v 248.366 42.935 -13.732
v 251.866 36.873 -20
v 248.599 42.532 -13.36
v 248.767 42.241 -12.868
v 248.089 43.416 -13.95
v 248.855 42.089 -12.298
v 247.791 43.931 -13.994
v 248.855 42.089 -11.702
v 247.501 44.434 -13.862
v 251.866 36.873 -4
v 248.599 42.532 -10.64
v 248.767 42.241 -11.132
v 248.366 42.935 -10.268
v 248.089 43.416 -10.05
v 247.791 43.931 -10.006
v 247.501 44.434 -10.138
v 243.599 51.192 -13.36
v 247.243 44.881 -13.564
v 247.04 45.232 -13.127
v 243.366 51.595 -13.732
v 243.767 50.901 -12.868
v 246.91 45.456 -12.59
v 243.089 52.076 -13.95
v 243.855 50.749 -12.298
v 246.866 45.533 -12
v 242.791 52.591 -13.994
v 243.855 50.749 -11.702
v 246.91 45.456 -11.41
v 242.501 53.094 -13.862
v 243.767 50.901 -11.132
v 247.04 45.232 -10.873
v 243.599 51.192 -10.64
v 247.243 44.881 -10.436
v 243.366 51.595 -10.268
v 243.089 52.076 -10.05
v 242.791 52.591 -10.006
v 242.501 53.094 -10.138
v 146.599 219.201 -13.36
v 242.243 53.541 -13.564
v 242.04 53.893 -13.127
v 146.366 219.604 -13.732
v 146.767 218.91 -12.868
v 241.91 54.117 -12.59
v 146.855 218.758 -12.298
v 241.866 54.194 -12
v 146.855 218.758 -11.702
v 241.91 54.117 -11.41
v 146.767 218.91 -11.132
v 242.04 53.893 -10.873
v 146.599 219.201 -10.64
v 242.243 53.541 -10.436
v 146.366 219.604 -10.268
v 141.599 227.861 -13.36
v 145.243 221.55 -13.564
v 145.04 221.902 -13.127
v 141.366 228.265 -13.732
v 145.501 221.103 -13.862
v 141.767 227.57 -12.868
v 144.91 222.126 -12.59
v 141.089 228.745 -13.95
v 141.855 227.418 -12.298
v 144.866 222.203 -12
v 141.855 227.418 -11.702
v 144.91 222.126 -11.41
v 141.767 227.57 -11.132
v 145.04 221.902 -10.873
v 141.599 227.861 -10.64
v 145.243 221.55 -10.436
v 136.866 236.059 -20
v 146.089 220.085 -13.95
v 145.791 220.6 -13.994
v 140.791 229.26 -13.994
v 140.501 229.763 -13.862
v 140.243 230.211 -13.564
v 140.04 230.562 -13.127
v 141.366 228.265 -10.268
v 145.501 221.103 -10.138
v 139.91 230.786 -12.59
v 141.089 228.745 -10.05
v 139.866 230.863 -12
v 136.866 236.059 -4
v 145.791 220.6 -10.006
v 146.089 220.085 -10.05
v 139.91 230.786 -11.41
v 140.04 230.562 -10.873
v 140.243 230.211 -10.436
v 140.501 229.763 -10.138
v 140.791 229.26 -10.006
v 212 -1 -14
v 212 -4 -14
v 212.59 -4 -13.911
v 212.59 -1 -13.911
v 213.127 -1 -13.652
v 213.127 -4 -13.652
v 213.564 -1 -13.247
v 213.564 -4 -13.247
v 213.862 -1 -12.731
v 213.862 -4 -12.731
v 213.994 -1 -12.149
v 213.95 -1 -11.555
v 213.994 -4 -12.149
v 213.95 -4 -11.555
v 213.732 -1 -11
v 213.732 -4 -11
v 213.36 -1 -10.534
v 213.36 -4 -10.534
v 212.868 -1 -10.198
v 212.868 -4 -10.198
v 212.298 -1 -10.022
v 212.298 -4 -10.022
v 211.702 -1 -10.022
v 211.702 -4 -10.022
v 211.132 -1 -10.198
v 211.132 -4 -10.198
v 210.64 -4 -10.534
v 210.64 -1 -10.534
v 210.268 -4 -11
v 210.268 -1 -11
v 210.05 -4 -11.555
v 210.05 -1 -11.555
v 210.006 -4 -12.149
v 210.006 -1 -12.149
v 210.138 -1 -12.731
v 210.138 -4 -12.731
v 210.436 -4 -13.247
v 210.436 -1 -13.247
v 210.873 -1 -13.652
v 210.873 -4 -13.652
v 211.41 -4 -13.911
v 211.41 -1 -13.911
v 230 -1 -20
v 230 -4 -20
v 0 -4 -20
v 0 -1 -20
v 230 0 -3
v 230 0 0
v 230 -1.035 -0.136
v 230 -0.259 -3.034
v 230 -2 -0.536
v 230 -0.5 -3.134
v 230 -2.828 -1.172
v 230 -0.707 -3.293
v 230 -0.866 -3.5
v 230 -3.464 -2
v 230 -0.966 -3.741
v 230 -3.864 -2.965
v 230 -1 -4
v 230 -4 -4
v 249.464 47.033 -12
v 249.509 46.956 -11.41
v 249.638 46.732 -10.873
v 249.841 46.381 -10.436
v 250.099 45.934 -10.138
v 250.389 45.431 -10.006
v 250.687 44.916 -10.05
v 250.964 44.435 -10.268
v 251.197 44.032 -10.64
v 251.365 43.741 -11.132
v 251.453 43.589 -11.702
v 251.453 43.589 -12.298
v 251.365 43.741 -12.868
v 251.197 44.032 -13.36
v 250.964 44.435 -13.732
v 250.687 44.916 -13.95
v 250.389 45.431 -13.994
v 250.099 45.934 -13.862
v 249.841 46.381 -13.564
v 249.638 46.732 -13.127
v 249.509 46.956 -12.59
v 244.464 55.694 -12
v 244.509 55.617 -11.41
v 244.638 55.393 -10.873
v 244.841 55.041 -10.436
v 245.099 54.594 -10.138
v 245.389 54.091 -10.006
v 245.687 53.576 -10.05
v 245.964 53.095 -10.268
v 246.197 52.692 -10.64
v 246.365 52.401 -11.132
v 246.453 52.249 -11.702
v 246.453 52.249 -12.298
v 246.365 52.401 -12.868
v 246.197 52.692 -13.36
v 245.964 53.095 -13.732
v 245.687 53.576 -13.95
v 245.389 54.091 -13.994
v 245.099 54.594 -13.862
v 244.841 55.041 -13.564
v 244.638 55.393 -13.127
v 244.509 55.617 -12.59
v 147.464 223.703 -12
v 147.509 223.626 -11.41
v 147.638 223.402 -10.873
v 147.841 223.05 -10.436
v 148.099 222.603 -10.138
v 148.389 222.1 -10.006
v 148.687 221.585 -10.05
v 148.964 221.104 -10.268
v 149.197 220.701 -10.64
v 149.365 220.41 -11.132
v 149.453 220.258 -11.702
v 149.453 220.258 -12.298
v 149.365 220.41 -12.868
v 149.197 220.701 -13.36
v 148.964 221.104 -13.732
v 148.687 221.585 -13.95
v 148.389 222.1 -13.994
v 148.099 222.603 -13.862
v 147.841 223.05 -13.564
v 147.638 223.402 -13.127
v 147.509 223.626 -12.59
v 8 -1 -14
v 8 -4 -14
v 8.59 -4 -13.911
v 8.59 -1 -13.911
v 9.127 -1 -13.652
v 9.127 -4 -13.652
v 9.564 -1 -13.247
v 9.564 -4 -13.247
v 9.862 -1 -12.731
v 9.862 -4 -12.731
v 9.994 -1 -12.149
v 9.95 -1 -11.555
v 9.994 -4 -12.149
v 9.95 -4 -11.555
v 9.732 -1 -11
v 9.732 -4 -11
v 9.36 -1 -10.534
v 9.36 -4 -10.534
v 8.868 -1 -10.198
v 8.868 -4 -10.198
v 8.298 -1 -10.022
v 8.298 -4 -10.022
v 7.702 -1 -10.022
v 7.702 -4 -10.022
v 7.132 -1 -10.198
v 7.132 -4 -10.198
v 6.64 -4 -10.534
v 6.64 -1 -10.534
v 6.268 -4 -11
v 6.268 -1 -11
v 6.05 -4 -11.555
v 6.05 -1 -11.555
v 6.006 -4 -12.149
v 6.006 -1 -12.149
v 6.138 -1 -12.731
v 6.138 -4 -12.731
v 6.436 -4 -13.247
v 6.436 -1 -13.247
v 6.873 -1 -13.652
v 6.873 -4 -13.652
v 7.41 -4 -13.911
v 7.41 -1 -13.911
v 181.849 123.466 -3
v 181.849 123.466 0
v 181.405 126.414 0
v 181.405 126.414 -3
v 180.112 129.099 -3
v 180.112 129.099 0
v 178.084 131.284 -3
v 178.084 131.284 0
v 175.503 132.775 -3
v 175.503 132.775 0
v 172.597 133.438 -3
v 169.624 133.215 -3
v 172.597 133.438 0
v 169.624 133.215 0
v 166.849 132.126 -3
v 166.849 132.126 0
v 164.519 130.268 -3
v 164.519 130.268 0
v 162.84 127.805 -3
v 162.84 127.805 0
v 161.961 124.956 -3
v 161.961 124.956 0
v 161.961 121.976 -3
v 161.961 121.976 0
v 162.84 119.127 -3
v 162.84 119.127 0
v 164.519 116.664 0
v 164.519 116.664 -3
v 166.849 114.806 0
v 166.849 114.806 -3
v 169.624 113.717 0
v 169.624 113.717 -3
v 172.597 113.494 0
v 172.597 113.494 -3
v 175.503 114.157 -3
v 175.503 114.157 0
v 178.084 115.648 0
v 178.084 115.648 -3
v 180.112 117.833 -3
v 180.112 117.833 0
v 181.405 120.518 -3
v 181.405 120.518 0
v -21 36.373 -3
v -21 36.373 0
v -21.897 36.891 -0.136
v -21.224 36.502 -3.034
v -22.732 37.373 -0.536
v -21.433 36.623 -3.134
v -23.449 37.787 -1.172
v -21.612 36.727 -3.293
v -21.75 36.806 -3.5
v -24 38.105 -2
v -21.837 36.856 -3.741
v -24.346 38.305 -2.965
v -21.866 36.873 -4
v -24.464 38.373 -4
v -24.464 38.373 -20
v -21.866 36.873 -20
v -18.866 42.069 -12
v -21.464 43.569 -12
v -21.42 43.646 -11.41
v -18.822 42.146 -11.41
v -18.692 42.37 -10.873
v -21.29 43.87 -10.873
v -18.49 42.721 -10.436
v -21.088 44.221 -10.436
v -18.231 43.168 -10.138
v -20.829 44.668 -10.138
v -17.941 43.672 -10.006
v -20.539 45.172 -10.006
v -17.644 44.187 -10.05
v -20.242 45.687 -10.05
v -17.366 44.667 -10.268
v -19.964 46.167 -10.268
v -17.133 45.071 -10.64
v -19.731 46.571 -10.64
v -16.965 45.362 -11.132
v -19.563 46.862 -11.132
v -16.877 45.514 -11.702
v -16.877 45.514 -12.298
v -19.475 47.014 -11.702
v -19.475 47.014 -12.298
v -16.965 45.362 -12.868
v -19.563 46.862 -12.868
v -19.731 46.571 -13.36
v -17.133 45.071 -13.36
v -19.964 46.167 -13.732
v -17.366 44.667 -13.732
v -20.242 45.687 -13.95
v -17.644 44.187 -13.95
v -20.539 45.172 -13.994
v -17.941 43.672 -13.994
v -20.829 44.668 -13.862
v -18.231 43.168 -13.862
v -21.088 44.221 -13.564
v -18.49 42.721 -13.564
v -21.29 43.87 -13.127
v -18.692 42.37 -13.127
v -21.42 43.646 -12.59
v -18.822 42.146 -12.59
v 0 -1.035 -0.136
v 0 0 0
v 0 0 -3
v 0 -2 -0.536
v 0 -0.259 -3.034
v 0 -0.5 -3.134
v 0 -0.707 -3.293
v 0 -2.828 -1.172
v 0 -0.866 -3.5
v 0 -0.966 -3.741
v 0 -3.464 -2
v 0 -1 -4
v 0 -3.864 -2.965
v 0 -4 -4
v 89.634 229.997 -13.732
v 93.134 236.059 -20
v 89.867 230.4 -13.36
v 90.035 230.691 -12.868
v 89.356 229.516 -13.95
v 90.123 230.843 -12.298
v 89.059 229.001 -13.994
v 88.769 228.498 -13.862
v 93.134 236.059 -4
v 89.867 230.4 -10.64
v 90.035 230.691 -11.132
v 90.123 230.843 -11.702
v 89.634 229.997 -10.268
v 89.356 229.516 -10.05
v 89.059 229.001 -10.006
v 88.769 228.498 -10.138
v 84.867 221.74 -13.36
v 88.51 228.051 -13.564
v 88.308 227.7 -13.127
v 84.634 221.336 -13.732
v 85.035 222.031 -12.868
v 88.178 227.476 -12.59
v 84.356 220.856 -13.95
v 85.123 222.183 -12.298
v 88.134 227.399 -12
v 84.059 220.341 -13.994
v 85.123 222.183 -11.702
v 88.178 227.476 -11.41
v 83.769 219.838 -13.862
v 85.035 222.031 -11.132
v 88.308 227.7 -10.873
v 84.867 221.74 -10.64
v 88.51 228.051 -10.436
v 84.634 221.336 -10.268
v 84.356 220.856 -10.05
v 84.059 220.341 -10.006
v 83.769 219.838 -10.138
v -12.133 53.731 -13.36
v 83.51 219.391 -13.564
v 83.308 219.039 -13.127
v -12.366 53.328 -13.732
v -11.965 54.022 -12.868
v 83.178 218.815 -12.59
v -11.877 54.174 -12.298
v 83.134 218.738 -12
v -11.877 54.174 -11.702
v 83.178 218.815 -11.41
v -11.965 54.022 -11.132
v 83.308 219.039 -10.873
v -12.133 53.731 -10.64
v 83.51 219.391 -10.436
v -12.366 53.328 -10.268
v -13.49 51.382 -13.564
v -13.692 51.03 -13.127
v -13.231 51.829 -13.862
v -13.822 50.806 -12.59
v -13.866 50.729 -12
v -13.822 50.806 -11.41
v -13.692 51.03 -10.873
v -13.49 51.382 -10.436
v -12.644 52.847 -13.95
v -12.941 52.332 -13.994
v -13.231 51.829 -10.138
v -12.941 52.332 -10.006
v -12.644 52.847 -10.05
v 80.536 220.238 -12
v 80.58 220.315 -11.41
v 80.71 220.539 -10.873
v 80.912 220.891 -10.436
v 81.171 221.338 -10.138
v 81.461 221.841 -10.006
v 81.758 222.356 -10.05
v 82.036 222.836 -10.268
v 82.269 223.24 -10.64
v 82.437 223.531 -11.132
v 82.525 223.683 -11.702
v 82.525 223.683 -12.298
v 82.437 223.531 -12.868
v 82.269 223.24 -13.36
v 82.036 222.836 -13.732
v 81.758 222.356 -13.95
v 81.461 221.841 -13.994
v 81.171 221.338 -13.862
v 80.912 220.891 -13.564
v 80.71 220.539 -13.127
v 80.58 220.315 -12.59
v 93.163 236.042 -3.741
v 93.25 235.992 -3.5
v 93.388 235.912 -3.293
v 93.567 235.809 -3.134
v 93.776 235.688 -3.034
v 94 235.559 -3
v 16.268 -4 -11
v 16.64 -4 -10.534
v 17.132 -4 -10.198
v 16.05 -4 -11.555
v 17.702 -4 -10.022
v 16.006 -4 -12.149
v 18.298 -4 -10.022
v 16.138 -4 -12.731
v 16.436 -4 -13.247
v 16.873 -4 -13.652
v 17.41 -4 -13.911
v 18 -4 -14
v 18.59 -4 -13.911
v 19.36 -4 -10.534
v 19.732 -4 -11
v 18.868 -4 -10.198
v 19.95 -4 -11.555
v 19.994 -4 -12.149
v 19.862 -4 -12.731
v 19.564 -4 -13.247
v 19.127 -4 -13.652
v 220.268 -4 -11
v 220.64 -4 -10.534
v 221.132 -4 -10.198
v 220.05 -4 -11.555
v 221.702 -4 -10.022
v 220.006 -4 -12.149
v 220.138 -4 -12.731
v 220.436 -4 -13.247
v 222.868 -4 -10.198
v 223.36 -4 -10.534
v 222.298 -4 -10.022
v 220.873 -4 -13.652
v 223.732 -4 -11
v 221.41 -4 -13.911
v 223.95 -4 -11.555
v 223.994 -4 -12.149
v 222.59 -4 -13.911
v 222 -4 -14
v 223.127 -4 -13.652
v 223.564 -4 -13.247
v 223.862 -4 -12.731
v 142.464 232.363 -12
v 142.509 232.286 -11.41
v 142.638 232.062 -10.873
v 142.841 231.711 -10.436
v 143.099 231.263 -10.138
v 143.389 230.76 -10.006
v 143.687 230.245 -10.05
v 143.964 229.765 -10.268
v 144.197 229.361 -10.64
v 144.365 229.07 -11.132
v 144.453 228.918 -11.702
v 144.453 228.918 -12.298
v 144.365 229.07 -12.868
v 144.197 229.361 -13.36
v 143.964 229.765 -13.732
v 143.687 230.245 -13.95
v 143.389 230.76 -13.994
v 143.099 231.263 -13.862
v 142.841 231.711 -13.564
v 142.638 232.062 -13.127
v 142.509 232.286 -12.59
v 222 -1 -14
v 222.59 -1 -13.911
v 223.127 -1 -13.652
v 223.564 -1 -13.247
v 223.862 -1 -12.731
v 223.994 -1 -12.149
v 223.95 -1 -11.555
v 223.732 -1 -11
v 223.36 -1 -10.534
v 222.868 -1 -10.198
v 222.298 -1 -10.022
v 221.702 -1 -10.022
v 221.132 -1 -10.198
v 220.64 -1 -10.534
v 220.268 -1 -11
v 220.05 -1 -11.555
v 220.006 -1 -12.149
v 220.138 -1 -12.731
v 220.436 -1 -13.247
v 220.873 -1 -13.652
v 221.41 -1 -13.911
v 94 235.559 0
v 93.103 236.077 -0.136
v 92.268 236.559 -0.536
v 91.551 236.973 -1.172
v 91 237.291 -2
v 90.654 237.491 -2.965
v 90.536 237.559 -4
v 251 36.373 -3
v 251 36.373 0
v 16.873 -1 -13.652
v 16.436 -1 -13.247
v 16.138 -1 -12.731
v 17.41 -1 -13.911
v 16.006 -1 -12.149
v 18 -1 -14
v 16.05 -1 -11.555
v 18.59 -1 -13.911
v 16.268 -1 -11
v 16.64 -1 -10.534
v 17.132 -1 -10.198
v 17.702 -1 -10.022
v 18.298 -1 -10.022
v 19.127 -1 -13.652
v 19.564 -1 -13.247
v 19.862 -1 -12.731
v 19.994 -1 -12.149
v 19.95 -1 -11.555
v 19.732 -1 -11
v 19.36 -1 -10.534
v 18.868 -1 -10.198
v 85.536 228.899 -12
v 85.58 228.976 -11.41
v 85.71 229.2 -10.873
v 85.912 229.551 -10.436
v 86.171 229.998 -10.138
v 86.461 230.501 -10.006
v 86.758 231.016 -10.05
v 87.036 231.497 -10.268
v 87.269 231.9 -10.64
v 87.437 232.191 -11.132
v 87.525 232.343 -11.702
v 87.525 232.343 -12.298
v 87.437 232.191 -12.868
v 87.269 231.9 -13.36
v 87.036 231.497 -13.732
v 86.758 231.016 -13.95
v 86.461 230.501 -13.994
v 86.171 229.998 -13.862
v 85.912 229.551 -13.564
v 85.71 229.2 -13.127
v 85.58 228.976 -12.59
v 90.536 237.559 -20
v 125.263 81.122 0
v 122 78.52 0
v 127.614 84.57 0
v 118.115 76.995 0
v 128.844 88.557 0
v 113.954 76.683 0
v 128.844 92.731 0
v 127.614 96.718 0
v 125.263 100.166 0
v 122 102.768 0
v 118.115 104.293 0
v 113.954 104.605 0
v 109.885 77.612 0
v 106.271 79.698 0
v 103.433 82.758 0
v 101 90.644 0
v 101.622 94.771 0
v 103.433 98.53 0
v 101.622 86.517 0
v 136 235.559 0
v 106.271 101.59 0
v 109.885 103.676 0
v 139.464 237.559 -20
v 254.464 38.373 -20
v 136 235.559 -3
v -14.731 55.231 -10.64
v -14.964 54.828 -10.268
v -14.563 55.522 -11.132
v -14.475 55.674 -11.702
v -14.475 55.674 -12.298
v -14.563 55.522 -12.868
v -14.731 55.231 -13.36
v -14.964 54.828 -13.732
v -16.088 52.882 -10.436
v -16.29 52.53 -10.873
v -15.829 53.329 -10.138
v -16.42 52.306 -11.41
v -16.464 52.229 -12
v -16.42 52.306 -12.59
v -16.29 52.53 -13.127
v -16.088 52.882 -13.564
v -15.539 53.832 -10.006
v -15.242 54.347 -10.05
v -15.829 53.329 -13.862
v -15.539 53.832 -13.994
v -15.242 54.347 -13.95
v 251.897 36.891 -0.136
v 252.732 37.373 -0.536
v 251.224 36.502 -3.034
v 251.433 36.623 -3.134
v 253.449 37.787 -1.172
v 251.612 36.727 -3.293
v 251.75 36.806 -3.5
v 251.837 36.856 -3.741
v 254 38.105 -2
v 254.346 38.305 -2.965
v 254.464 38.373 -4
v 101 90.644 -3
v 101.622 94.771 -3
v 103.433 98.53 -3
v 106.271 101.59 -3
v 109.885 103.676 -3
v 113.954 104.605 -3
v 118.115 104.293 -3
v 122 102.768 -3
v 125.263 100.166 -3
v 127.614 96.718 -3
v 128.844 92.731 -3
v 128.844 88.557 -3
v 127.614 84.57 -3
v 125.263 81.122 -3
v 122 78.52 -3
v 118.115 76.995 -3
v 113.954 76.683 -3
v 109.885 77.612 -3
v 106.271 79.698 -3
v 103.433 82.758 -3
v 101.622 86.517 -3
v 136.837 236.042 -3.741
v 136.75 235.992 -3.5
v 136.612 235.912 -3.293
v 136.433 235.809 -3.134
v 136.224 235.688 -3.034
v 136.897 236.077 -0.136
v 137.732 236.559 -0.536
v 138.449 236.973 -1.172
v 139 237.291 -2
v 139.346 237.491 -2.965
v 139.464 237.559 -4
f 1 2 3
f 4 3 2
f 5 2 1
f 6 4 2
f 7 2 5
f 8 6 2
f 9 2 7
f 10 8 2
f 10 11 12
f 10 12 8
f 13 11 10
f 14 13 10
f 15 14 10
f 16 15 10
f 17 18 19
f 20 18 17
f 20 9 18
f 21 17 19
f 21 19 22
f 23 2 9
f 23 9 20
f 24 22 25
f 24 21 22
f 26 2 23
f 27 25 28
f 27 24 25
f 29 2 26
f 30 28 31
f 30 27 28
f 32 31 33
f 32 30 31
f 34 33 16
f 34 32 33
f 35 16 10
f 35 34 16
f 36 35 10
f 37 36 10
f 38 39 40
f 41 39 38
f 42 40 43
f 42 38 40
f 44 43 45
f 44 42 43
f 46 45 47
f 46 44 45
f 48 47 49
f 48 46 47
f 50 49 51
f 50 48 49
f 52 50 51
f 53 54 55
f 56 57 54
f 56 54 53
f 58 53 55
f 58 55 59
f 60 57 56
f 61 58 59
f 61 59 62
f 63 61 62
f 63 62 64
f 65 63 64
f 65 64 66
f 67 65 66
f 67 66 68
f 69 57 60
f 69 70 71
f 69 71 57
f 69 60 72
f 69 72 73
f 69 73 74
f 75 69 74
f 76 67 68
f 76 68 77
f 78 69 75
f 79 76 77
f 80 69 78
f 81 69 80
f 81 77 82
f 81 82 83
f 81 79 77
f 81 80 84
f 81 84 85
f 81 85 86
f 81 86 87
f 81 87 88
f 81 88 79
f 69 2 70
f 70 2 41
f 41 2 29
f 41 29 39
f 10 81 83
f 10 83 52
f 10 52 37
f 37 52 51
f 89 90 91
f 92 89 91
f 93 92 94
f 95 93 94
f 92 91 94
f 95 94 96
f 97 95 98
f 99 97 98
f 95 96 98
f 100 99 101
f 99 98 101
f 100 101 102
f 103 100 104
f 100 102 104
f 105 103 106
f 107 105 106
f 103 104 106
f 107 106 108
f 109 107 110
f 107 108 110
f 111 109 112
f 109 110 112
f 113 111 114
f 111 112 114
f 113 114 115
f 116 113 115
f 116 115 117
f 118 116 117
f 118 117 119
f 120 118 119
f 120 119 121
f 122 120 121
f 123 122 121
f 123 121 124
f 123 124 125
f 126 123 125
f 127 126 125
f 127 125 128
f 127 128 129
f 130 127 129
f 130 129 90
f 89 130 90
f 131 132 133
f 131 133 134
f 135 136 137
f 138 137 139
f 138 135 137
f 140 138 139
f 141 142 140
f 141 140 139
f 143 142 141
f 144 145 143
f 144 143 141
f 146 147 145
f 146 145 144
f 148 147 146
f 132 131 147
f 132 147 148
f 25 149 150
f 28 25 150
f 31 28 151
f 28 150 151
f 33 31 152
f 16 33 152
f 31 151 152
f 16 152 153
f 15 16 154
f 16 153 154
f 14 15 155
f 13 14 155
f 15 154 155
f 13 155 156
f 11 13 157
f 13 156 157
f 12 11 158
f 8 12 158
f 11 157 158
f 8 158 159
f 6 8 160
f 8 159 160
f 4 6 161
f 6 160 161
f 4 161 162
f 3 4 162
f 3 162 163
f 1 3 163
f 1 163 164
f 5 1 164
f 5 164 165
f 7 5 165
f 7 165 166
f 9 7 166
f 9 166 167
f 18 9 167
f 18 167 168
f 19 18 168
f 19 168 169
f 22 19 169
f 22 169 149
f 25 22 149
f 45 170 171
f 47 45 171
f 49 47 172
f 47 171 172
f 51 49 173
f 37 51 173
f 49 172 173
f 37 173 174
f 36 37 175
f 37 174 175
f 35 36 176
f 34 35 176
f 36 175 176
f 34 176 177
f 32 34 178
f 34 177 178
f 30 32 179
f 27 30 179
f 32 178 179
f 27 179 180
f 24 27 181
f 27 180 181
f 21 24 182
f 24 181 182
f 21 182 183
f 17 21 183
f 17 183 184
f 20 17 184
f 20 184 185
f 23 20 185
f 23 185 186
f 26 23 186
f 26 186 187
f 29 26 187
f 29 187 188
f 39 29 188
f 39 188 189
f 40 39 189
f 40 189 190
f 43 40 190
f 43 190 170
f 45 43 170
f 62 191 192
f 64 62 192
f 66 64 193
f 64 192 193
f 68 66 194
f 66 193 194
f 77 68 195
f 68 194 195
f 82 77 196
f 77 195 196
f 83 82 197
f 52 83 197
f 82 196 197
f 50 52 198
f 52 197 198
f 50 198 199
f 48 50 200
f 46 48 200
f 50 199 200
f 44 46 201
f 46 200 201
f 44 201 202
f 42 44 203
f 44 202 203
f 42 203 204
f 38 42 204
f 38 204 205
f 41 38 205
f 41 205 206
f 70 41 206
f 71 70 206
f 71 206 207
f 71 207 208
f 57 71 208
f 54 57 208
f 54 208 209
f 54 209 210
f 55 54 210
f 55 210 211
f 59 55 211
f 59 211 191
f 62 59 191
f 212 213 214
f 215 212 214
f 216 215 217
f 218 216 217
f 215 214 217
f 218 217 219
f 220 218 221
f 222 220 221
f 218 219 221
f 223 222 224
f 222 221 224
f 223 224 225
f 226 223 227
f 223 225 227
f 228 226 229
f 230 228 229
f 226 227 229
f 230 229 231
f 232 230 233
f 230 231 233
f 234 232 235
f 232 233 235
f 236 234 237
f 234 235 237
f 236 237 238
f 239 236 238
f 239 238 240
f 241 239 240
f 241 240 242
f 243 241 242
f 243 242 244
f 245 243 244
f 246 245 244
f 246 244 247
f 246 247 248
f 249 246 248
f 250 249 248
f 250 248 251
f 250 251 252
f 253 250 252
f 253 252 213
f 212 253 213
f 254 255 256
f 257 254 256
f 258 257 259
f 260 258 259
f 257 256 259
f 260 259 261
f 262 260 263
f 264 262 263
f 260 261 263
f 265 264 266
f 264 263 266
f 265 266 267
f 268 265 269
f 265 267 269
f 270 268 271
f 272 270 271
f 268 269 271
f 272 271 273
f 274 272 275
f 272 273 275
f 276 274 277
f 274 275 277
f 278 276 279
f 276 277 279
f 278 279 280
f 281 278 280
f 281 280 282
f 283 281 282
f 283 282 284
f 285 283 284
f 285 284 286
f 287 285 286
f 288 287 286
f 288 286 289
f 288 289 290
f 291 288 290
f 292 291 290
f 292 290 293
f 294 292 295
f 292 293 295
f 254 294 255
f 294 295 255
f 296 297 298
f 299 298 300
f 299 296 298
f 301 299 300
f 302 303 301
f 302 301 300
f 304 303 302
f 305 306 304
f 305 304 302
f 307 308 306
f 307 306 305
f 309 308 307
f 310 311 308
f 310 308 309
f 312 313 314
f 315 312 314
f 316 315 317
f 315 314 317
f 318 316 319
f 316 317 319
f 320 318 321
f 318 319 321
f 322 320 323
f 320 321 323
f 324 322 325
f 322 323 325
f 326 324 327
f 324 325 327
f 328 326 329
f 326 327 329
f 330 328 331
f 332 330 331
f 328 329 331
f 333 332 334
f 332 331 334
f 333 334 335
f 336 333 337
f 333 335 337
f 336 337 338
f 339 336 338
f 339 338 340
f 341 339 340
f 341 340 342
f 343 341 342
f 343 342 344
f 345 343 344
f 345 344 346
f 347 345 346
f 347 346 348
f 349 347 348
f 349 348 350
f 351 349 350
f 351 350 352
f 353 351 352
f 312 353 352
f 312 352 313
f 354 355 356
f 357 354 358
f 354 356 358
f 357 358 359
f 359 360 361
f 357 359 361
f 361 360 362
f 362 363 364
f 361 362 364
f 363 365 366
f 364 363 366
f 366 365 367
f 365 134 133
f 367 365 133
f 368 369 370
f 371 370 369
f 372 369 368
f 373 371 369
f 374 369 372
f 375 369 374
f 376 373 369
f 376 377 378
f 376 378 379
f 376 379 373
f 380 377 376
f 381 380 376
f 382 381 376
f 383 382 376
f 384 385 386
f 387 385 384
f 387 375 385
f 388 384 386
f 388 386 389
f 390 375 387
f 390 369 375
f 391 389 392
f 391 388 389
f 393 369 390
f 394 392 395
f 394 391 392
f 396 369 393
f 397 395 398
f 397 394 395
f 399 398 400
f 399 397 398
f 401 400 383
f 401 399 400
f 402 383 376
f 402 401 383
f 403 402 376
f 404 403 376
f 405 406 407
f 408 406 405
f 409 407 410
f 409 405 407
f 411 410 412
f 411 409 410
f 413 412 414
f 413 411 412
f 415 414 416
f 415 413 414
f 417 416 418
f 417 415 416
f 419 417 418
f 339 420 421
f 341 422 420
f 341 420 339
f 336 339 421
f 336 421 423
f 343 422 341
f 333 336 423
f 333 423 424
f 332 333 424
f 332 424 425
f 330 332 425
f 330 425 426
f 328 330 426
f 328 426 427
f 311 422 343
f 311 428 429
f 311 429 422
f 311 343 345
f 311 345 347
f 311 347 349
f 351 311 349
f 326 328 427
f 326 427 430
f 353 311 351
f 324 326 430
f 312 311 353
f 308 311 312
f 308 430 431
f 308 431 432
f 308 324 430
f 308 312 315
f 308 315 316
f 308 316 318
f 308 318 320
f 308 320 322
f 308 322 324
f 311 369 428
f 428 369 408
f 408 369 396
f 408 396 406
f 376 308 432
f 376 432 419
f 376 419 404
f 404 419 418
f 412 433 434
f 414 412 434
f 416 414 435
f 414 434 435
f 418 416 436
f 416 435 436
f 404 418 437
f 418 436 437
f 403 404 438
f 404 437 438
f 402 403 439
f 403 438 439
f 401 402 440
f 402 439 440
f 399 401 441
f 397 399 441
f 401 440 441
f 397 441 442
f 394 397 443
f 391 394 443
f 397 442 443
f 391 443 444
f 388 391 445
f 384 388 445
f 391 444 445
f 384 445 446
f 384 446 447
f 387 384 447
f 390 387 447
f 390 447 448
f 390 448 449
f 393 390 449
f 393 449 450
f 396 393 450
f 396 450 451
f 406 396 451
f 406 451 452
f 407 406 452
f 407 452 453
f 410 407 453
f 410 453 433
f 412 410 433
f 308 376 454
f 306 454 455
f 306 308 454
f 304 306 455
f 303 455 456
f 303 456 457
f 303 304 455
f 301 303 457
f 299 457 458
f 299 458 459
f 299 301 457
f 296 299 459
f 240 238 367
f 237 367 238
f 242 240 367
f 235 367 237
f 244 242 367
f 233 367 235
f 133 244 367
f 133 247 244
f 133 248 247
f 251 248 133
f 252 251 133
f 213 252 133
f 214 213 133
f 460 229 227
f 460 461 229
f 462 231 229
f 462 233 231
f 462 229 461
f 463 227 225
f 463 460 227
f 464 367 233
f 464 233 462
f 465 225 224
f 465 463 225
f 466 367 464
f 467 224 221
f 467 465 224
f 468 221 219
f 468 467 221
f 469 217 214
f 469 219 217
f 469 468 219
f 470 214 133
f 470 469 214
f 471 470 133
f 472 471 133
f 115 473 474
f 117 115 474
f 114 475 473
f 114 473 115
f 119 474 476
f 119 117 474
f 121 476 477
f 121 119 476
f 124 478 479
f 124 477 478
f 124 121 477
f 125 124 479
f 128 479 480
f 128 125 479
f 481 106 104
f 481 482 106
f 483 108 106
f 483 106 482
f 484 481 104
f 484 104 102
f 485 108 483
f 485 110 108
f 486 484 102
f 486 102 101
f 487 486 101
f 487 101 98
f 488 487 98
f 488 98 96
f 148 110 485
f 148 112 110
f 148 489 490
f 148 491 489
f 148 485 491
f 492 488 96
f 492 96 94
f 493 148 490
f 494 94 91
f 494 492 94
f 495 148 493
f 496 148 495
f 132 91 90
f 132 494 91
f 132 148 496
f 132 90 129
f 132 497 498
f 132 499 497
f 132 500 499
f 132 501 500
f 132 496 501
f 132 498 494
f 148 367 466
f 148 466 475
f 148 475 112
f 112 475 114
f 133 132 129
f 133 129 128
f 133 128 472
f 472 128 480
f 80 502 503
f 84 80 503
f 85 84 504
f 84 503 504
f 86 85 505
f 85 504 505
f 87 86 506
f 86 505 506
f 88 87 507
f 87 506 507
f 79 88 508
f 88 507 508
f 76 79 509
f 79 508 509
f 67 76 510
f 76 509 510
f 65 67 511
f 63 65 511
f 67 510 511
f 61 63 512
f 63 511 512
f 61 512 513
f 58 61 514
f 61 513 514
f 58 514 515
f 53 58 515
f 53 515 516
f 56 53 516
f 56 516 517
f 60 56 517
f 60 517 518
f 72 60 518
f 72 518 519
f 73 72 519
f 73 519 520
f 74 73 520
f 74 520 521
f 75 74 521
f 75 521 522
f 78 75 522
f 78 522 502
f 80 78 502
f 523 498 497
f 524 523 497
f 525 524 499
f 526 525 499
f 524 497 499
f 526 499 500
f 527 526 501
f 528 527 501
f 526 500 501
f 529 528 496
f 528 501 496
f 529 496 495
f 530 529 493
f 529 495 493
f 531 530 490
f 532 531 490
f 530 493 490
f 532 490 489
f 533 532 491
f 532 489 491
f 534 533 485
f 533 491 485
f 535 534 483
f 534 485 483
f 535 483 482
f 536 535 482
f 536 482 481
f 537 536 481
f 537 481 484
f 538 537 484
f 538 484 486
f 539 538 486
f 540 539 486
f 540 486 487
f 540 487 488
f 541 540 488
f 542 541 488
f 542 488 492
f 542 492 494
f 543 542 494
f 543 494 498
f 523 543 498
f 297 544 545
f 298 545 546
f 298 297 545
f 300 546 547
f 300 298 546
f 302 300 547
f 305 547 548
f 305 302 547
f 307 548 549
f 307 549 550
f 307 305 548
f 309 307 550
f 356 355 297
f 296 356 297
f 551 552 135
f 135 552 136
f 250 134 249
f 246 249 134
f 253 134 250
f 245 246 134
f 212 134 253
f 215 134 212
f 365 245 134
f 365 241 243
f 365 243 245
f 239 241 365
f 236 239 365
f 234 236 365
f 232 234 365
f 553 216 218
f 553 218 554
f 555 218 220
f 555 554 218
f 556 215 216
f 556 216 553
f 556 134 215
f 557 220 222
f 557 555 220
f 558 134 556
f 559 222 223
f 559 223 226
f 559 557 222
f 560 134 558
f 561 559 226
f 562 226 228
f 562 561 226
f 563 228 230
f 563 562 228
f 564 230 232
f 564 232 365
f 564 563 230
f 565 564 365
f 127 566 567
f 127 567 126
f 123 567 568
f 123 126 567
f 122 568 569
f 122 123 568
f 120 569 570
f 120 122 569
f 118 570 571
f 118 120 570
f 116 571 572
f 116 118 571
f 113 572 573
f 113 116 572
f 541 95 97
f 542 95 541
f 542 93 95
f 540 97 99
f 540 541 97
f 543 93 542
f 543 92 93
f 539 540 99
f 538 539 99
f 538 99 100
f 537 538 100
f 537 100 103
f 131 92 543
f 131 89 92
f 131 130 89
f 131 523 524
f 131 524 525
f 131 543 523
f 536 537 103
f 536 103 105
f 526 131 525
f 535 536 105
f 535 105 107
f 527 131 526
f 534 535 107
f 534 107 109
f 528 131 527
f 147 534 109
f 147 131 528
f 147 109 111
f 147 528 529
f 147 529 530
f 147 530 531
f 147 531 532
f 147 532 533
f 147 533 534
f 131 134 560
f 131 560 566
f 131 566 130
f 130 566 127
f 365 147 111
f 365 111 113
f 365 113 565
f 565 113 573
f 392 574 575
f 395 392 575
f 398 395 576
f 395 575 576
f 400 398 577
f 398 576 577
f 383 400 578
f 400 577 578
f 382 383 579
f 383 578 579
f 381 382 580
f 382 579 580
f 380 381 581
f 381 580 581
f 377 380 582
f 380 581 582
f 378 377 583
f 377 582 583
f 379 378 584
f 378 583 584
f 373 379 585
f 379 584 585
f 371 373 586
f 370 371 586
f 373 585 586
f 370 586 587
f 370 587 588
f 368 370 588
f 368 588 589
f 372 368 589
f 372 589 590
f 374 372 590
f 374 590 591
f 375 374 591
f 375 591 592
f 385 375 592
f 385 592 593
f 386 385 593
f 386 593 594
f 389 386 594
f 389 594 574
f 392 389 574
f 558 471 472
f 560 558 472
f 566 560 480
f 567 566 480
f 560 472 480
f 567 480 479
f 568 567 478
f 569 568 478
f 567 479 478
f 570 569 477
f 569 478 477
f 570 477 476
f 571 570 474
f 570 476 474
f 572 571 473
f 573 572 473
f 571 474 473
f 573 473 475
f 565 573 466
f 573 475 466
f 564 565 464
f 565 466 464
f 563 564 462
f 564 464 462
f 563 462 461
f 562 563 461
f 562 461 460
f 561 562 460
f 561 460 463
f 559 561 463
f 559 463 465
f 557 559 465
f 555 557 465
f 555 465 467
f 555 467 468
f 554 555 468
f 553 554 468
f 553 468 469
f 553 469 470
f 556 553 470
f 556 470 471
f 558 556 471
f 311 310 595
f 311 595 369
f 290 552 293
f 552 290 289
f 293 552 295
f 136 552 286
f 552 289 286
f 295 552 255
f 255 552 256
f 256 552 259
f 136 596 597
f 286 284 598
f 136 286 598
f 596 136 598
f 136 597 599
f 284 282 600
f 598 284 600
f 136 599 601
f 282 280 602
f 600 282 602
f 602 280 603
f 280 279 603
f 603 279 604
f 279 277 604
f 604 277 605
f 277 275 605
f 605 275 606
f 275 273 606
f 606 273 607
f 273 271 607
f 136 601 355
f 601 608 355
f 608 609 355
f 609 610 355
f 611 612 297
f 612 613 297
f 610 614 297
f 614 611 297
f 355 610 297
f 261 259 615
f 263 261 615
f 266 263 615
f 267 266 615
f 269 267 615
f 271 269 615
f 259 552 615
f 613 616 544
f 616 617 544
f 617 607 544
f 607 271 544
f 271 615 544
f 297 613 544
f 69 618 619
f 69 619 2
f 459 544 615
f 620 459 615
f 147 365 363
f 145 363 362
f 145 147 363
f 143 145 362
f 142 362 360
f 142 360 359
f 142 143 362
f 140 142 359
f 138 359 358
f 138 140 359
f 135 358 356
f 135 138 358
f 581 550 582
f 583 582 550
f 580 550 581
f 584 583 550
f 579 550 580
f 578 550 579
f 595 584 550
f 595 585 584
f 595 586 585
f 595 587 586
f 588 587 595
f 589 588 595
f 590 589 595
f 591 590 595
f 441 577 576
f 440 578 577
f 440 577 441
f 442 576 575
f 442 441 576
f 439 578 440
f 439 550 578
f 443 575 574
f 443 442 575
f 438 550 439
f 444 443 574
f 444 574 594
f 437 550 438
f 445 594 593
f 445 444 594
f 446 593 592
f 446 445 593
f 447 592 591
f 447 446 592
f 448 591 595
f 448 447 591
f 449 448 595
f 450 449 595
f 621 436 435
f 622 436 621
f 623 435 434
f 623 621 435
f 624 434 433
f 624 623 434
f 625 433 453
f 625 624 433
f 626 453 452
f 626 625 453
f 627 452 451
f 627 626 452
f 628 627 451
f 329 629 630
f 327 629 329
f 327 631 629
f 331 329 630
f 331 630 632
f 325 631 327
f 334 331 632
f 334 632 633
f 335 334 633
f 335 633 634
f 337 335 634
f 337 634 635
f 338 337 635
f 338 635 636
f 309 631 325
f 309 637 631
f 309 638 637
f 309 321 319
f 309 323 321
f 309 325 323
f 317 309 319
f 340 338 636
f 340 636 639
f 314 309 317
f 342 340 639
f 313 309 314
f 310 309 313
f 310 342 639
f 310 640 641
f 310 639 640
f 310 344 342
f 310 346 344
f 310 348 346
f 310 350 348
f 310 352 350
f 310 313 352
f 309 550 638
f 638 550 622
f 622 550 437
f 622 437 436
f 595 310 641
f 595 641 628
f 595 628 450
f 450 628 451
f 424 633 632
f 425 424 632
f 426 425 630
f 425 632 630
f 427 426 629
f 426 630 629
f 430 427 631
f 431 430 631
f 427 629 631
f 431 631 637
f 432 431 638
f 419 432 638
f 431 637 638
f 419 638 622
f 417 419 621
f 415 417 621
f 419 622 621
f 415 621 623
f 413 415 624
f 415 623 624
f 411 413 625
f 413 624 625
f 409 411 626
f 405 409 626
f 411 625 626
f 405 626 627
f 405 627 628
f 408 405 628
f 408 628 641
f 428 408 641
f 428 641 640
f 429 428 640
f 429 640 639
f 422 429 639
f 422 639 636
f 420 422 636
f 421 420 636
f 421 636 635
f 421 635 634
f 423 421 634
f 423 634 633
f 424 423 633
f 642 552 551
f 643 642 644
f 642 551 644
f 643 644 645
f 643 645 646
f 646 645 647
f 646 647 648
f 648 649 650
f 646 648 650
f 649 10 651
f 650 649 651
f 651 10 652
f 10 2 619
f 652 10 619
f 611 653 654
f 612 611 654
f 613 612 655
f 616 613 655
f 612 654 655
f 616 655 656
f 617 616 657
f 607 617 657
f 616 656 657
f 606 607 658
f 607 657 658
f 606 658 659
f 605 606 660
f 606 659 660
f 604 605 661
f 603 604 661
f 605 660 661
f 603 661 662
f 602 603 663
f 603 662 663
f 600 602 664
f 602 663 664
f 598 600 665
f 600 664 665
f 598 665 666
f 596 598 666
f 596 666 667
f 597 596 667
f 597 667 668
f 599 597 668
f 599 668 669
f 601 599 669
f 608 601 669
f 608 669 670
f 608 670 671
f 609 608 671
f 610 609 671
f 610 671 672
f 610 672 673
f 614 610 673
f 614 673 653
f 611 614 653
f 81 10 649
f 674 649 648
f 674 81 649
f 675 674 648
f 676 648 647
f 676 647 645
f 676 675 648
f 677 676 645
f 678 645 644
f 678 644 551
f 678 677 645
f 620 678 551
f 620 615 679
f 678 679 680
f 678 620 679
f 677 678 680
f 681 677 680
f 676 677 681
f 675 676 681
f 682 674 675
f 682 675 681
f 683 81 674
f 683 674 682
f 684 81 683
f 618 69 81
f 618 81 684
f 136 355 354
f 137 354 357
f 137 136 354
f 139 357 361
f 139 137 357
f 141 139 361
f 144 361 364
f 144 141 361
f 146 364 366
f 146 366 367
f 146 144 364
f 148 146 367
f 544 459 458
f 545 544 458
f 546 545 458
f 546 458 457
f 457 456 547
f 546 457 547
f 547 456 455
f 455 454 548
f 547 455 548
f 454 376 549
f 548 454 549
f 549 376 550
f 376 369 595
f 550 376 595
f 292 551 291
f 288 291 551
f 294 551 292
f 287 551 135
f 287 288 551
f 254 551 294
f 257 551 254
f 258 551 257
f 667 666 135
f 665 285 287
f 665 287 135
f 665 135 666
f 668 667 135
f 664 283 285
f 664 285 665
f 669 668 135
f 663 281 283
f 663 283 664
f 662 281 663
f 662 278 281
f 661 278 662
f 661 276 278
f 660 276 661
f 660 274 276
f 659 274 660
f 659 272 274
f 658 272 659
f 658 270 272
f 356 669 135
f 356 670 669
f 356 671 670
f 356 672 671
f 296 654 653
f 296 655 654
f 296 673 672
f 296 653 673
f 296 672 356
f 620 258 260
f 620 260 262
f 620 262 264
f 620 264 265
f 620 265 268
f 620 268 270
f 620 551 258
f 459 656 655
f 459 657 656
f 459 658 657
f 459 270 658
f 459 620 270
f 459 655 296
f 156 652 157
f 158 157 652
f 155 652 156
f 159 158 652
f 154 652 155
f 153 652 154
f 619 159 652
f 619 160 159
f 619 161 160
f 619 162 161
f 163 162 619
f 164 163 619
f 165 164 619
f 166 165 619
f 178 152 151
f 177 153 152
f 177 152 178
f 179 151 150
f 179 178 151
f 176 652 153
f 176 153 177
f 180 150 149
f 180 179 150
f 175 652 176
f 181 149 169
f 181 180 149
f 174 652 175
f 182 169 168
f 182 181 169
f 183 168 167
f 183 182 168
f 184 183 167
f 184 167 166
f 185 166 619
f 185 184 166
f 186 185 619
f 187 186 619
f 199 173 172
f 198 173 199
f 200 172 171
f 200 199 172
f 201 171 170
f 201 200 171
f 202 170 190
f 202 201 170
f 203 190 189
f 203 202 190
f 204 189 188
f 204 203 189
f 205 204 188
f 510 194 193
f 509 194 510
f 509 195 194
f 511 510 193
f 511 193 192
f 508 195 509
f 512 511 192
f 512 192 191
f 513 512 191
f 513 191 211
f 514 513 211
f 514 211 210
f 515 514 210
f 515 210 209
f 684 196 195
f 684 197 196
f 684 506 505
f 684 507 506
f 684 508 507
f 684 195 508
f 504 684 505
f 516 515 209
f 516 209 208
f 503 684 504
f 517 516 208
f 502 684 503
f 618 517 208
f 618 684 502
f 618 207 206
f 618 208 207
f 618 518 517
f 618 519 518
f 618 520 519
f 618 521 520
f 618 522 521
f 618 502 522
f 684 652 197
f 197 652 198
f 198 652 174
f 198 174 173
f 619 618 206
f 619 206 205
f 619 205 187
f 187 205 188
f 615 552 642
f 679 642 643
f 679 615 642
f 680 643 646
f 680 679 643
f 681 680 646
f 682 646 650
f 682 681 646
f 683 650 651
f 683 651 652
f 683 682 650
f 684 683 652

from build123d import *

# Parameters (mm, degrees)
SKETCH_10_R                   = 10
SM_BASE_FLANGE_3_DEPTH        = 3
SM_EDGE_FLANGE_6_DEPTH        = 230
SM_EDGE_FLANGE_6_BEND_DEPTH   = 230
SM_EDGE_FLANGE_6_BEND_2_DEPTH = 230
CUT_EXTRUDE_4_REACH           = 364.518
SKETCH_47_R                   = 2
CUT_EXTRUDE_6_REACH           = 265.651
SKETCH_50_R                   = 2
CUT_EXTRUDE_7_REACH           = 353.429
SKETCH_51_R                   = 2
CUT_EXTRUDE_8_REACH           = 350.533
SKETCH_52_R                   = 14


# Sheet-metal steps are written as plain solids
with BuildPart() as part:
    # Эскиз10 → Базовая кромка3 (new body)
    with BuildSketch(Plane.XY):
        Polygon((0, 0), (-21, 36.373066959), (94, 235.558909829), (136, 235.558909829), (251, 36.373066959), (230, 0), align=None)
        with Locations((171.849364905, 123.465988394)):
            Circle(SKETCH_10_R, mode=Mode.SUBTRACT)
    extrude(amount=-SM_BASE_FLANGE_3_DEPTH)

    # Ребро-кромка6 section (across the edge) → Ребро-кромка6 (add)
    with BuildSketch(Plane(origin=(-21.866025404, 36.873066959, -3), x_dir=(0.8660254037844436, -0.4999999999999914, -3.4914813388431334e-15), z_dir=(0.4999999999999914, 0.8660254037844436, 0))):
        with BuildLine():
            Line((-3, 1), (-3, 17))
            Line((-3, 17), (0, 17))
            Line((0, 17), (0, 1))
            ThreePointArc((0, 1), (0.292893219, 0.292893219), (1, 0))
            Line((1, 0), (1, -3))
            ThreePointArc((1, -3), (-1.828427125, -1.828427125), (-3, 1))
        make_face()
    extrude(amount=SM_EDGE_FLANGE_6_DEPTH)

    # Ребро-кромка6 section 2 (across the edge) → Ребро-кромка6 bend (add)
    with BuildSketch(Plane(origin=(136.866025404, 236.058909829, -3), x_dir=(-0.8660254037844363, -0.5000000000000041, -3.4914813388431334e-15), z_dir=(0.5000000000000041, -0.8660254037844363, 0))):
        with BuildLine():
            Line((-3, 1), (-3, 17))
            Line((-3, 17), (0, 17))
            Line((0, 17), (0, 1))
            ThreePointArc((0, 1), (0.292893219, 0.292893219), (1, 0))
            Line((1, 0), (1, -3))
            ThreePointArc((1, -3), (-1.828427125, -1.828427125), (-3, 1))
        make_face()
    extrude(amount=SM_EDGE_FLANGE_6_BEND_DEPTH)

    # Ребро-кромка6 section 3 (across the edge) → Ребро-кромка6 bend 2 (add)
    with BuildSketch(Plane(origin=(230, -1, -3), x_dir=(0, 1, 0), z_dir=(-1, 0, 0))):
        with BuildLine():
            Line((-3, 1), (-3, 17))
            Line((-3, 17), (0, 17))
            Line((0, 17), (0, 1))
            ThreePointArc((0, 1), (0.292893219, 0.292893219), (1, 0))
            Line((1, 0), (1, -3))
            ThreePointArc((1, -3), (-1.828427125, -1.828427125), (-3, 1))
        make_face()
    extrude(amount=SM_EDGE_FLANGE_6_BEND_2_DEPTH)

    # Эскиз47 → Вырез-Вытянуть4 (cut, up to next)
    with BuildSketch(Plane(origin=(-34.964101615, 20.186533479, 0), x_dir=(0, 0, 1), z_dir=(-0.866025403784443, 0.4999999999999925, 3.788649256556814e-15)), mode=Mode.PRIVATE) as cut_extrude_4_sk1:
        with Locations(Location((-12, 29, 0), (0, 0, 270))):
            Circle(SKETCH_47_R)
    cut_extrude_4_tool1 = extrude(cut_extrude_4_sk1.sketch, amount=-CUT_EXTRUDE_4_REACH, mode=Mode.PRIVATE) & part.part
    # Эскиз47 → Вырез-Вытянуть4 (cut, up to next)
    with BuildSketch(Plane(origin=(-34.964101615, 20.186533479, 0), x_dir=(0, 0, 1), z_dir=(-0.866025403784443, 0.4999999999999925, 3.788649256556814e-15)), mode=Mode.PRIVATE) as cut_extrude_4_sk2:
        with Locations(Location((-12, 39, 0), (0, 0, 270))):
            Circle(SKETCH_47_R)
    cut_extrude_4_tool2 = extrude(cut_extrude_4_sk2.sketch, amount=-CUT_EXTRUDE_4_REACH, mode=Mode.PRIVATE) & part.part
    # Эскиз47 → Вырез-Вытянуть4 (cut, up to next)
    with BuildSketch(Plane(origin=(-34.964101615, 20.186533479, 0), x_dir=(0, 0, 1), z_dir=(-0.866025403784443, 0.4999999999999925, 3.788649256556814e-15)), mode=Mode.PRIVATE) as cut_extrude_4_sk3:
        with Locations(Location((-12, 233, 0), (0, 0, 270))):
            Circle(SKETCH_47_R)
    cut_extrude_4_tool3 = extrude(cut_extrude_4_sk3.sketch, amount=-CUT_EXTRUDE_4_REACH, mode=Mode.PRIVATE) & part.part
    # Эскиз47 → Вырез-Вытянуть4 (cut, up to next)
    with BuildSketch(Plane(origin=(-34.964101615, 20.186533479, 0), x_dir=(0, 0, 1), z_dir=(-0.866025403784443, 0.4999999999999925, 3.788649256556814e-15)), mode=Mode.PRIVATE) as cut_extrude_4_sk4:
        with Locations(Location((-12, 243, 0), (0, 0, 270))):
            Circle(SKETCH_47_R)
    cut_extrude_4_tool4 = extrude(cut_extrude_4_sk4.sketch, amount=-CUT_EXTRUDE_4_REACH, mode=Mode.PRIVATE) & part.part
    add(cut_extrude_4_tool1.solids().sort_by_distance((-20.464102, 45.30127, -12))[0], mode=Mode.SUBTRACT)
    add(cut_extrude_4_tool2.solids().sort_by_distance((-15.464102, 53.961524, -12))[0], mode=Mode.SUBTRACT)
    add(cut_extrude_4_tool3.solids().sort_by_distance((81.535898, 221.970453, -12))[0], mode=Mode.SUBTRACT)
    add(cut_extrude_4_tool4.solids().sort_by_distance((86.535898, 230.630707, -12))[0], mode=Mode.SUBTRACT)

    # Эскиз50 → Вырез-Вытянуть6 (cut, up to next)
    with BuildSketch(Plane(origin=(207.464101615, 119.779454915, 0), x_dir=(0, 0, -1), z_dir=(0.866025403784436, 0.5000000000000047, 3.0623287353932815e-15)), mode=Mode.PRIVATE) as cut_extrude_6_sk1:
        with Locations(Location((12, -86, 0), (0, 0, 90))):
            Circle(SKETCH_50_R)
    cut_extrude_6_tool1 = extrude(cut_extrude_6_sk1.sketch, amount=-CUT_EXTRUDE_6_REACH, mode=Mode.PRIVATE) & part.part
    # Эскиз50 → Вырез-Вытянуть6 (cut, up to next)
    with BuildSketch(Plane(origin=(207.464101615, 119.779454915, 0), x_dir=(0, 0, -1), z_dir=(0.866025403784436, 0.5000000000000047, 3.0623287353932815e-15)), mode=Mode.PRIVATE) as cut_extrude_6_sk2:
        with Locations(Location((12, -76, 0), (0, 0, 90))):
            Circle(SKETCH_50_R)
    cut_extrude_6_tool2 = extrude(cut_extrude_6_sk2.sketch, amount=-CUT_EXTRUDE_6_REACH, mode=Mode.PRIVATE) & part.part
    # Эскиз50 → Вырез-Вытянуть6 (cut, up to next)
    with BuildSketch(Plane(origin=(207.464101615, 119.779454915, 0), x_dir=(0, 0, -1), z_dir=(0.866025403784436, 0.5000000000000047, 3.0623287353932815e-15)), mode=Mode.PRIVATE) as cut_extrude_6_sk3:
        with Locations(Location((12, 118, 0), (0, 0, 90))):
            Circle(SKETCH_50_R)
    cut_extrude_6_tool3 = extrude(cut_extrude_6_sk3.sketch, amount=-CUT_EXTRUDE_6_REACH, mode=Mode.PRIVATE) & part.part
    # Эскиз50 → Вырез-Вытянуть6 (cut, up to next)
    with BuildSketch(Plane(origin=(207.464101615, 119.779454915, 0), x_dir=(0, 0, -1), z_dir=(0.866025403784436, 0.5000000000000047, 3.0623287353932815e-15)), mode=Mode.PRIVATE) as cut_extrude_6_sk4:
        with Locations(Location((12, 128, 0), (0, 0, 90))):
            Circle(SKETCH_50_R)
    cut_extrude_6_tool4 = extrude(cut_extrude_6_sk4.sketch, amount=-CUT_EXTRUDE_6_REACH, mode=Mode.PRIVATE) & part.part
    add(cut_extrude_6_tool1.solids().sort_by_distance((250.464102, 45.30127, -12))[0], mode=Mode.SUBTRACT)
    add(cut_extrude_6_tool2.solids().sort_by_distance((245.464102, 53.961524, -12))[0], mode=Mode.SUBTRACT)
    add(cut_extrude_6_tool3.solids().sort_by_distance((148.464102, 221.970453, -12))[0], mode=Mode.SUBTRACT)
    add(cut_extrude_6_tool4.solids().sort_by_distance((143.464102, 230.630707, -12))[0], mode=Mode.SUBTRACT)

    # Эскиз51 → Вырез-Вытянуть7 (cut, up to next)
    with BuildSketch(Plane.XZ.offset(4), mode=Mode.PRIVATE) as cut_extrude_7_sk1:
        with Locations(Location((222, -12, 0), (0, 0, 270))):
            Circle(SKETCH_51_R)
    cut_extrude_7_tool1 = extrude(cut_extrude_7_sk1.sketch, amount=-CUT_EXTRUDE_7_REACH, mode=Mode.PRIVATE) & part.part
    # Эскиз51 → Вырез-Вытянуть7 (cut, up to next)
    with BuildSketch(Plane.XZ.offset(4), mode=Mode.PRIVATE) as cut_extrude_7_sk2:
        with Locations(Location((212, -12, 0), (0, 0, 270))):
            Circle(SKETCH_51_R)
    cut_extrude_7_tool2 = extrude(cut_extrude_7_sk2.sketch, amount=-CUT_EXTRUDE_7_REACH, mode=Mode.PRIVATE) & part.part
    # Эскиз51 → Вырез-Вытянуть7 (cut, up to next)
    with BuildSketch(Plane.XZ.offset(4), mode=Mode.PRIVATE) as cut_extrude_7_sk3:
        with Locations(Location((18, -12, 0), (0, 0, 270))):
            Circle(SKETCH_51_R)
    cut_extrude_7_tool3 = extrude(cut_extrude_7_sk3.sketch, amount=-CUT_EXTRUDE_7_REACH, mode=Mode.PRIVATE) & part.part
    # Эскиз51 → Вырез-Вытянуть7 (cut, up to next)
    with BuildSketch(Plane.XZ.offset(4), mode=Mode.PRIVATE) as cut_extrude_7_sk4:
        with Locations(Location((8, -12, 0), (0, 0, 270))):
            Circle(SKETCH_51_R)
    cut_extrude_7_tool4 = extrude(cut_extrude_7_sk4.sketch, amount=-CUT_EXTRUDE_7_REACH, mode=Mode.PRIVATE) & part.part
    add(cut_extrude_7_tool1.solids().sort_by_distance((222, -4, -12))[0], mode=Mode.SUBTRACT)
    add(cut_extrude_7_tool2.solids().sort_by_distance((212, -4, -12))[0], mode=Mode.SUBTRACT)
    add(cut_extrude_7_tool3.solids().sort_by_distance((18, -4, -12))[0], mode=Mode.SUBTRACT)
    add(cut_extrude_7_tool4.solids().sort_by_distance((8, -4, -12))[0], mode=Mode.SUBTRACT)

    # Эскиз52 → Вырез-Вытянуть8 (cut, up to next)
    with BuildSketch(Plane(origin=(0, 0, -3), x_dir=(-1, 0, 0), z_dir=(0, 0, -1)), mode=Mode.PRIVATE) as cut_extrude_8_sk1:
        with Locations((-115, 90.643992263)):
            Circle(SKETCH_52_R)
    cut_extrude_8_tool1 = extrude(cut_extrude_8_sk1.sketch, amount=-CUT_EXTRUDE_8_REACH, mode=Mode.PRIVATE) & part.part
    add(cut_extrude_8_tool1.solids().sort_by_distance((115, 90.643992, -3))[0], mode=Mode.SUBTRACT)


solid = part.part
